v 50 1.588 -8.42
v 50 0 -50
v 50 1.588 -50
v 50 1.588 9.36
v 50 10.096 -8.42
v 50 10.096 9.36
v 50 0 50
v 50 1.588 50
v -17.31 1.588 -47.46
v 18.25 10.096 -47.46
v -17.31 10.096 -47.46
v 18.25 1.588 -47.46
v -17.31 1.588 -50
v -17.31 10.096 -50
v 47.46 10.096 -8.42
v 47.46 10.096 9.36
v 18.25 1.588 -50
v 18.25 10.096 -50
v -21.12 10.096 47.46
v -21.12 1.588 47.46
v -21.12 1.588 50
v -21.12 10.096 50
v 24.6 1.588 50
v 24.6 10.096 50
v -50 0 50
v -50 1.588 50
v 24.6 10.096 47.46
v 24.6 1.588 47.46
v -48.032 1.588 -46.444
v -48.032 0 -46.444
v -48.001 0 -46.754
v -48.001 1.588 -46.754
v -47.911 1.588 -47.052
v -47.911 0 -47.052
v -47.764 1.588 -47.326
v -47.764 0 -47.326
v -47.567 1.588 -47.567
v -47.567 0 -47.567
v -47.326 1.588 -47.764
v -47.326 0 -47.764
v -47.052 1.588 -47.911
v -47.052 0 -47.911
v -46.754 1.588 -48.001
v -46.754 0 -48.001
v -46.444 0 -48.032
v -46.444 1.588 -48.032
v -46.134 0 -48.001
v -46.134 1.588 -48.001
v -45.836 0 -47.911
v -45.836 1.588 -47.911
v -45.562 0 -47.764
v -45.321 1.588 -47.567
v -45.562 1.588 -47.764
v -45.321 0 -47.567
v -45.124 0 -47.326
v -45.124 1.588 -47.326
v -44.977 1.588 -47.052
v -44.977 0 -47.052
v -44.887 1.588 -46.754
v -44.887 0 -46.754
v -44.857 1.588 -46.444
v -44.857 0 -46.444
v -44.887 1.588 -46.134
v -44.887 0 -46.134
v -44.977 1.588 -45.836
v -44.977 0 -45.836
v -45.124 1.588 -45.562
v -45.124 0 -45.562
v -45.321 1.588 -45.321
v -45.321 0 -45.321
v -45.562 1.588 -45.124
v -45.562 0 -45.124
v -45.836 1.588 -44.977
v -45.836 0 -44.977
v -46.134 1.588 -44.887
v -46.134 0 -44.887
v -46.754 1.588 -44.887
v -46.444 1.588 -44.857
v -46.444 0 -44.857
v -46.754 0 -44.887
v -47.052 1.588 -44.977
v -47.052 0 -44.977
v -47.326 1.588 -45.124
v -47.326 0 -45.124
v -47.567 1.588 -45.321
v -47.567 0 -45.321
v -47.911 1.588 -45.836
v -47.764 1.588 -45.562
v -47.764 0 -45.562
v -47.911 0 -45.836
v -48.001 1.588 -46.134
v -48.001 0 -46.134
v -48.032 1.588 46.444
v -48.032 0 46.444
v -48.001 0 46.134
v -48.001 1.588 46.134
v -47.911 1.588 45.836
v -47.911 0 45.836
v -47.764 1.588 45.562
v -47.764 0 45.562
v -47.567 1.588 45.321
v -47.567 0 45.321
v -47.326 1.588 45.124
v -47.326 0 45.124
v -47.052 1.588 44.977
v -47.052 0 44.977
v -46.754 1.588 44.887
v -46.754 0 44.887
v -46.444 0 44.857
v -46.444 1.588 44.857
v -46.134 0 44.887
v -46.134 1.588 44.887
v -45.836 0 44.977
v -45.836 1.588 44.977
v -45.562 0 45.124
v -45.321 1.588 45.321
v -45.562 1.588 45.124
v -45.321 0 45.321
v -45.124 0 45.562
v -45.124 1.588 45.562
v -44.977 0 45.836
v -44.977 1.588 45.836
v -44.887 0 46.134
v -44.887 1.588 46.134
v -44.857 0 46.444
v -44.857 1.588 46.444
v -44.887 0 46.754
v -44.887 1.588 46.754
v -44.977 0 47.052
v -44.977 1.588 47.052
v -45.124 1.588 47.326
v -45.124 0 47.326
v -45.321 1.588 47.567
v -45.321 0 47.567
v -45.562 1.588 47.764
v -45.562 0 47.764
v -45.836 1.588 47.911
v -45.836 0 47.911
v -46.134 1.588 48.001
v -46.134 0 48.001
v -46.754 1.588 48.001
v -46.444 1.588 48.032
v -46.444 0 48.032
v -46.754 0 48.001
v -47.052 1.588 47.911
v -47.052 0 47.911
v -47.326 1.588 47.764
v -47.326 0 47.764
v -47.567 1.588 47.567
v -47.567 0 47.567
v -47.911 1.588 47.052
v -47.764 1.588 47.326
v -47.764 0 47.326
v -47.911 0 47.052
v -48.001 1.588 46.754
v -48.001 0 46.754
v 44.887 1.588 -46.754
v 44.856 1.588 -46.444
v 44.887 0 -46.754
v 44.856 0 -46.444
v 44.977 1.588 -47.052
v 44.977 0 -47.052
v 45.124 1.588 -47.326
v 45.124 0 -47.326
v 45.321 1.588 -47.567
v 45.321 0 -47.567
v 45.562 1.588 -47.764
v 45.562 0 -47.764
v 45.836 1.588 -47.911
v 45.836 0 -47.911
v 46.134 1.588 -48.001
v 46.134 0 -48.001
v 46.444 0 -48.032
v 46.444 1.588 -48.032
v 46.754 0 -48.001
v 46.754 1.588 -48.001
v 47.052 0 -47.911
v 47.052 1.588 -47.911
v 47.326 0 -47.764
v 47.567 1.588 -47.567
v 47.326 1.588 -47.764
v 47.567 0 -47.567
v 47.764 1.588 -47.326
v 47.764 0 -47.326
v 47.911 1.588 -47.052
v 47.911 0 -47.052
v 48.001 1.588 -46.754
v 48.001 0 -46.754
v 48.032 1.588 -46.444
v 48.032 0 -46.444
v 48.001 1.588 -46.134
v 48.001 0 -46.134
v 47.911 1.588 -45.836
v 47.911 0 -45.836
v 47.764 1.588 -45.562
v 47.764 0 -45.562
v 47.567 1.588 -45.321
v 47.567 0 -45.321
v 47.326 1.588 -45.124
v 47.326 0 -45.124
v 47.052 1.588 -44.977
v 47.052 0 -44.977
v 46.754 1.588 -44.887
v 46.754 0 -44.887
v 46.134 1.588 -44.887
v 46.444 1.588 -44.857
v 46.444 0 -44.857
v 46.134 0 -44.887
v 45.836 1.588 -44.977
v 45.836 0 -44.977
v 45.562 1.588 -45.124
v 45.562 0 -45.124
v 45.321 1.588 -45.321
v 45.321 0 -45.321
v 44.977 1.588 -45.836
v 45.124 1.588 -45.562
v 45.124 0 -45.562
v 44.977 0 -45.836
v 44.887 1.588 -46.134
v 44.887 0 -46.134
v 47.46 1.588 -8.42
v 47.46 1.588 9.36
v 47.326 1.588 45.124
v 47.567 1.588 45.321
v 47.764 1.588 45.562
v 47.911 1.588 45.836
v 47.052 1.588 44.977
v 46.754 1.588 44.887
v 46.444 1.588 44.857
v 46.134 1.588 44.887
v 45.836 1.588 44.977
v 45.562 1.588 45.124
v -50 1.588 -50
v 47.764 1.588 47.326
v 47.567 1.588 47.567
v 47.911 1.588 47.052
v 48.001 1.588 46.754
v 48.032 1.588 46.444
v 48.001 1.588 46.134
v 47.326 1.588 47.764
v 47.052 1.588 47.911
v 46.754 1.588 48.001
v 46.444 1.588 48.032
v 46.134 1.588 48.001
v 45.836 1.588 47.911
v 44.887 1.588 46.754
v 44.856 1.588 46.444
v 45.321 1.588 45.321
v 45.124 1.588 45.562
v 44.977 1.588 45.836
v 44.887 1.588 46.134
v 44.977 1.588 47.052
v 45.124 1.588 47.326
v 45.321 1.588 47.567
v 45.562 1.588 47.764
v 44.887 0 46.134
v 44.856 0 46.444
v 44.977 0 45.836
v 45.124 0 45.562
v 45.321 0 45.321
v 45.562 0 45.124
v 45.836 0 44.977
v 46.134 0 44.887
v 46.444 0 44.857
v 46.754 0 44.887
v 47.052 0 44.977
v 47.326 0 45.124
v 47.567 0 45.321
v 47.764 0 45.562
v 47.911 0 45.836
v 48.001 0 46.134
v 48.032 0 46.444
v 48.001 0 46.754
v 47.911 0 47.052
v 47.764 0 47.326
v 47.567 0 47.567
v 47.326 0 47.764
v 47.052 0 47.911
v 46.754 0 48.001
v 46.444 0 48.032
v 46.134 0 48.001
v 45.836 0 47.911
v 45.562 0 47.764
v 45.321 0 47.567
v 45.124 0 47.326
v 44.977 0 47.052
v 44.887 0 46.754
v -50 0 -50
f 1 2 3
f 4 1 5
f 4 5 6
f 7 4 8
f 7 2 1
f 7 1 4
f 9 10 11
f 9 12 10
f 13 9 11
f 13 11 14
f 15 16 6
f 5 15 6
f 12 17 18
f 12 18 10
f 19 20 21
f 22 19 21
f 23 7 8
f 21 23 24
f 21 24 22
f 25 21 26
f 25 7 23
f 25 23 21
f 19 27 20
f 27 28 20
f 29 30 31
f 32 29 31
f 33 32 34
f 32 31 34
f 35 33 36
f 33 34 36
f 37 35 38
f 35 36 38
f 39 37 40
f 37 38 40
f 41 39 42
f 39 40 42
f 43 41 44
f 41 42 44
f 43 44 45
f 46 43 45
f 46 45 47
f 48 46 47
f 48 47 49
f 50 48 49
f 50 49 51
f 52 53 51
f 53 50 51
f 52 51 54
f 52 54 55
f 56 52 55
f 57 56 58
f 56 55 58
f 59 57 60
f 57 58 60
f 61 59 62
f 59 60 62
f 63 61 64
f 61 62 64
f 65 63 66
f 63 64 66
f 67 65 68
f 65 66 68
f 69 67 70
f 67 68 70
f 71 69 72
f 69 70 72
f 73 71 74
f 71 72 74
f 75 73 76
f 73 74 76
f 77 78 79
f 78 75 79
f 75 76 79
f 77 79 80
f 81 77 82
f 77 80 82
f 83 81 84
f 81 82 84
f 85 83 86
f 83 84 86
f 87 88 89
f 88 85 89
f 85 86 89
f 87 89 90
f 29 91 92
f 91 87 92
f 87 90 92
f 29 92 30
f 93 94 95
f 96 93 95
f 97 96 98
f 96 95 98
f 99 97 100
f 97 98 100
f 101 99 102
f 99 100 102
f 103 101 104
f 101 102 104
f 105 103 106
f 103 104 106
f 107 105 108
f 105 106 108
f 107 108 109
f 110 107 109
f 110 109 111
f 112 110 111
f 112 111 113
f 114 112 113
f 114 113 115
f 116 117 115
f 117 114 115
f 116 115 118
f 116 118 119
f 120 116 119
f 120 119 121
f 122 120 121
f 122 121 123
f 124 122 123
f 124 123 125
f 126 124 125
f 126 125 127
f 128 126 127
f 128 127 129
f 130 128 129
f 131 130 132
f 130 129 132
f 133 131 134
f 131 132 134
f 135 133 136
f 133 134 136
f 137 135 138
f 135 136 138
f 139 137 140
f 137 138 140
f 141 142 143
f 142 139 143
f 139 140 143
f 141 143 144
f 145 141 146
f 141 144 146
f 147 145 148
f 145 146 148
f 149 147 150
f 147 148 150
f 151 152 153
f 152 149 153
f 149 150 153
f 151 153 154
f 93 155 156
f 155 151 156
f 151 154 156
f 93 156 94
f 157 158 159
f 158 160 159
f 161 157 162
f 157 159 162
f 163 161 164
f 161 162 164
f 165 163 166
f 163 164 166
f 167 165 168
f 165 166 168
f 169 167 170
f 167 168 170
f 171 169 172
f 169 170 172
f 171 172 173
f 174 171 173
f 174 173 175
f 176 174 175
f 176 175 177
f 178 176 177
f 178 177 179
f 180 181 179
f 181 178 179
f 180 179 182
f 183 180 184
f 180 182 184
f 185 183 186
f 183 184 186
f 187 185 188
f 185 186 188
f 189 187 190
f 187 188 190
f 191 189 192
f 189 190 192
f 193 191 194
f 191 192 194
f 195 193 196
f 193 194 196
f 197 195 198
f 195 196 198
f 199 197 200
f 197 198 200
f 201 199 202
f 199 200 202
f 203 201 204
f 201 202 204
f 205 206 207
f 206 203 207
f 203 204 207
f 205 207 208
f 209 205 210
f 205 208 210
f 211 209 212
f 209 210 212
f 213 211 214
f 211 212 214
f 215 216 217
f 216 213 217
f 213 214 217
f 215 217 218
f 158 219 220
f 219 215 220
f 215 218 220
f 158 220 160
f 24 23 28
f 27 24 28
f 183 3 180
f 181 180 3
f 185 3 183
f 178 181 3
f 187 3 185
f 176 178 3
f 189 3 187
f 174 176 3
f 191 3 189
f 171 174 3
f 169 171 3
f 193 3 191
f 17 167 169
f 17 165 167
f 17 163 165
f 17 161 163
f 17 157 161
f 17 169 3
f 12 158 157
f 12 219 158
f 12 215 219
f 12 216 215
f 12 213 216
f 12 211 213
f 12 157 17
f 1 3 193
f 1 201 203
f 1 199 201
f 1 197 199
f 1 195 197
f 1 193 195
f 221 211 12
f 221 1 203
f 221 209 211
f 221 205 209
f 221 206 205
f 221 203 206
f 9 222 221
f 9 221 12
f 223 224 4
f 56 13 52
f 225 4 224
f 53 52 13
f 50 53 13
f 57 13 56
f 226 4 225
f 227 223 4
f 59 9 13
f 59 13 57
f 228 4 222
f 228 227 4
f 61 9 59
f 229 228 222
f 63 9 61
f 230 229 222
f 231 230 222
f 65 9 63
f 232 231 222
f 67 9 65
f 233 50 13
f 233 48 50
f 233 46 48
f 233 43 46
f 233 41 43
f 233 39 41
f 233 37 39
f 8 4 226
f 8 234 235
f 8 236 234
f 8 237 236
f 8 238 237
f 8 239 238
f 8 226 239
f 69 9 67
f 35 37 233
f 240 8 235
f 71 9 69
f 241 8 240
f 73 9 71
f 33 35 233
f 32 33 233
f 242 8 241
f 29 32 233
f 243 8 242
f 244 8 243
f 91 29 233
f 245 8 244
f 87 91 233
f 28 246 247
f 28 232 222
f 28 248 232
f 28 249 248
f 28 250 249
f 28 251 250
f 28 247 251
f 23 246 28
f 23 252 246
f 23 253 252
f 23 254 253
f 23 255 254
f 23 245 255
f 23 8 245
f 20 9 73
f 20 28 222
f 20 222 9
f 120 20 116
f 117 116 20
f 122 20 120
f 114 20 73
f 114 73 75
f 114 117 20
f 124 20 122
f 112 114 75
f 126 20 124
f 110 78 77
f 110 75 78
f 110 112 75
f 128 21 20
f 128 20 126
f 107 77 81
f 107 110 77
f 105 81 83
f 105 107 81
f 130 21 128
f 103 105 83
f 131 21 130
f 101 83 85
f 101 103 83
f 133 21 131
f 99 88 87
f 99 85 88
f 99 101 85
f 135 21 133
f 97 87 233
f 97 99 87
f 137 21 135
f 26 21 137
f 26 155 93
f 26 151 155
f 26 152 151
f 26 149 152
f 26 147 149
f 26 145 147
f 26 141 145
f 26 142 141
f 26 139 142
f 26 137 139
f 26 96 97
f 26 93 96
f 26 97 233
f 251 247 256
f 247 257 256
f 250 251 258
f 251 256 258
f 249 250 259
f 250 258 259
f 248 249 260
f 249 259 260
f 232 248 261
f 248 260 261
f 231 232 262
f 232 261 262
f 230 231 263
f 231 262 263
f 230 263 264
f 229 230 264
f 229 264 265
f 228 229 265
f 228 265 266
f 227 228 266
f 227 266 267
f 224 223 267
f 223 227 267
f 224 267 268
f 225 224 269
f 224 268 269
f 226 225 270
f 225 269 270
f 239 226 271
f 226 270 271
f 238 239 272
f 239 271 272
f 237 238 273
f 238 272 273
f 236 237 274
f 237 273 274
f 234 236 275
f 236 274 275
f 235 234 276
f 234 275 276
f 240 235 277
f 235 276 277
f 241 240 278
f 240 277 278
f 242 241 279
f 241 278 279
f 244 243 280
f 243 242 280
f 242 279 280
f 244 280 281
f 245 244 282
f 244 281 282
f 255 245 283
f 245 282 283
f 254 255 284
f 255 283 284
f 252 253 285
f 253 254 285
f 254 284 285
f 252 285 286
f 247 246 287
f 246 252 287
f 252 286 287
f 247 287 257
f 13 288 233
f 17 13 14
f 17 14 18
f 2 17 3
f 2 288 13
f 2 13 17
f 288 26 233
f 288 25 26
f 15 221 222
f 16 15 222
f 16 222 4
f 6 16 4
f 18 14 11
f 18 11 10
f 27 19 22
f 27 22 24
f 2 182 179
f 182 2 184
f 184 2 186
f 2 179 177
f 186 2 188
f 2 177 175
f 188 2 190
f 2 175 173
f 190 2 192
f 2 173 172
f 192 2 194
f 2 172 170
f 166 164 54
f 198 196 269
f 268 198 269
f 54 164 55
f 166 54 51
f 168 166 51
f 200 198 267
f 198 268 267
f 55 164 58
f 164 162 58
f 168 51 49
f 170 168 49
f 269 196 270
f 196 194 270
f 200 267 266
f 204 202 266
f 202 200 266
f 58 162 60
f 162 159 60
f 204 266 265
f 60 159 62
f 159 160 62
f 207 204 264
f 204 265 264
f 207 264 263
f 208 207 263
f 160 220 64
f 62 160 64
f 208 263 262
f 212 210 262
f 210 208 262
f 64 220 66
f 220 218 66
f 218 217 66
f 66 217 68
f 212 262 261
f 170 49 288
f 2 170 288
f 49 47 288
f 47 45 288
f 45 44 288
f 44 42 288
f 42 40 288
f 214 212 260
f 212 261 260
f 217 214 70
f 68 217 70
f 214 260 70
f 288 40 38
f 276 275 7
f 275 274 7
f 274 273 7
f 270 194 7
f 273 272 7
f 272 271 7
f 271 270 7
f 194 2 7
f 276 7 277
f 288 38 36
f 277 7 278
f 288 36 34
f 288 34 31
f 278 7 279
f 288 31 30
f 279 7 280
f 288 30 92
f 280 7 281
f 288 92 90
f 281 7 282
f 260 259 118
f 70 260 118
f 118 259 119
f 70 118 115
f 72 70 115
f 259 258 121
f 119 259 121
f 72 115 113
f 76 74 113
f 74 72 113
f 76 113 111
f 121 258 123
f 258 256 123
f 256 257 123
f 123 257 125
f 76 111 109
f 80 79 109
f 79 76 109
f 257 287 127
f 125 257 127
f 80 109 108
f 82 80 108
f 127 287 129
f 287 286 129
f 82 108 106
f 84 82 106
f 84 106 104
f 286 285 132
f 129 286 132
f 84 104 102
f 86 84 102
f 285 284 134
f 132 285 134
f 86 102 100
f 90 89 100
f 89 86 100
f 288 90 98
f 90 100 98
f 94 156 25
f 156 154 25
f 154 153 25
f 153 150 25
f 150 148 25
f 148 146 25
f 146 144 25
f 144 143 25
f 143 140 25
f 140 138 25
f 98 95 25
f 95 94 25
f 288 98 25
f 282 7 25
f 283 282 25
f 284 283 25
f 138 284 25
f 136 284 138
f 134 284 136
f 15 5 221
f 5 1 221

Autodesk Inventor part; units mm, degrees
ref_plane "YZ Plane" through (0, 0, 0) normal (1, 0, 0) x (0, 1, 0)
ref_plane "XZ Plane" through (0, 0, 0) normal (0, 1, 0) x (-1, 0, 0)
ref_plane "XY Plane" through (0, 0, 0) normal (0, 0, 1) x (1, 0, 0)
sketch "Sketch1" plane through (0, 0, 0) normal (0, 1, 0) x (-1, 0, 0)
  line L0 (-50, 50) -> (50, 50)
  line L1 (50, 50) -> (50, -50)
  line L2 (50, -50) -> (-50, -50)
  line L3 (-50, -50) -> (-50, 50)
  line L4 (-50, 50) -> (50, -50) construction
  line L5 (50, 50) -> (-50, -50) construction
  circle A0 centre (46.444, 46.444) radius 1.5875
  circle A1 centre (46.444, -46.444) radius 1.5875
  circle A2 centre (-46.444, -46.444) radius 1.5875
  circle A3 centre (-46.444, 46.444) radius 1.5875
  point P0 (0, 0)
  dimension "d0" = 100
  dimension "d1" = 100
  dimension "d2" = 3.175
  dimension "d3" = 3.175
  dimension "d4" = 3.175
  dimension "d5" = 3.175
  dimension "d6" = 3.556
  dimension "d7" = 3.556
  dimension "d8" = 3.556
  dimension "d9" = 3.556
extrude "Extrusion1" add sketch "Sketch1" along normal blind 1.5875
sketch "Sketch2" plane through (0, 1.5875, 0) normal (0, 1, 0) x (1, 0, 0)
  line L0 (-21.12, -50) -> (24.6, -50)
  line L1 (24.6, -50) -> (24.6, -47.46)
  line L2 (24.6, -47.46) -> (-21.12, -47.46)
  line L3 (-21.12, -47.46) -> (-21.12, -50)
  line L4 (50, 50) -> (-50, 50) projected
  line L5 (-17.31, 50) -> (18.25, 50)
  line L6 (18.25, 50) -> (18.25, 47.46)
  line L7 (18.25, 47.46) -> (-17.31, 47.46)
  line L8 (-17.31, 47.46) -> (-17.31, 50)
  line L9 (50, 8.42) -> (47.46, 8.42)
  line L10 (47.46, 8.42) -> (47.46, -9.36)
  line L11 (47.46, -9.36) -> (50, -9.36)
  line L12 (50, -9.36) -> (50, 8.42)
  line L13 (50, -50) -> (50, 50) projected
  line L14 (-50, -50) -> (50, -50) projected
  point P0 (0, 0)
  dimension "d12" = 2.54
  dimension "d13" = 2.54
  dimension "d14" = 2.54
  dimension "d15" = 0
  dimension "d16" = 0
  dimension "d17" = 25.4
  dimension "d18" = 45.72
  dimension "d19" = 17.78
  dimension "d20" = 35.56
  dimension "d21" = 40.64
  dimension "d22" = 31.75
extrude "Extrusion2" add sketch "Sketch2" along normal blind 8.509
properties part number "Board"
